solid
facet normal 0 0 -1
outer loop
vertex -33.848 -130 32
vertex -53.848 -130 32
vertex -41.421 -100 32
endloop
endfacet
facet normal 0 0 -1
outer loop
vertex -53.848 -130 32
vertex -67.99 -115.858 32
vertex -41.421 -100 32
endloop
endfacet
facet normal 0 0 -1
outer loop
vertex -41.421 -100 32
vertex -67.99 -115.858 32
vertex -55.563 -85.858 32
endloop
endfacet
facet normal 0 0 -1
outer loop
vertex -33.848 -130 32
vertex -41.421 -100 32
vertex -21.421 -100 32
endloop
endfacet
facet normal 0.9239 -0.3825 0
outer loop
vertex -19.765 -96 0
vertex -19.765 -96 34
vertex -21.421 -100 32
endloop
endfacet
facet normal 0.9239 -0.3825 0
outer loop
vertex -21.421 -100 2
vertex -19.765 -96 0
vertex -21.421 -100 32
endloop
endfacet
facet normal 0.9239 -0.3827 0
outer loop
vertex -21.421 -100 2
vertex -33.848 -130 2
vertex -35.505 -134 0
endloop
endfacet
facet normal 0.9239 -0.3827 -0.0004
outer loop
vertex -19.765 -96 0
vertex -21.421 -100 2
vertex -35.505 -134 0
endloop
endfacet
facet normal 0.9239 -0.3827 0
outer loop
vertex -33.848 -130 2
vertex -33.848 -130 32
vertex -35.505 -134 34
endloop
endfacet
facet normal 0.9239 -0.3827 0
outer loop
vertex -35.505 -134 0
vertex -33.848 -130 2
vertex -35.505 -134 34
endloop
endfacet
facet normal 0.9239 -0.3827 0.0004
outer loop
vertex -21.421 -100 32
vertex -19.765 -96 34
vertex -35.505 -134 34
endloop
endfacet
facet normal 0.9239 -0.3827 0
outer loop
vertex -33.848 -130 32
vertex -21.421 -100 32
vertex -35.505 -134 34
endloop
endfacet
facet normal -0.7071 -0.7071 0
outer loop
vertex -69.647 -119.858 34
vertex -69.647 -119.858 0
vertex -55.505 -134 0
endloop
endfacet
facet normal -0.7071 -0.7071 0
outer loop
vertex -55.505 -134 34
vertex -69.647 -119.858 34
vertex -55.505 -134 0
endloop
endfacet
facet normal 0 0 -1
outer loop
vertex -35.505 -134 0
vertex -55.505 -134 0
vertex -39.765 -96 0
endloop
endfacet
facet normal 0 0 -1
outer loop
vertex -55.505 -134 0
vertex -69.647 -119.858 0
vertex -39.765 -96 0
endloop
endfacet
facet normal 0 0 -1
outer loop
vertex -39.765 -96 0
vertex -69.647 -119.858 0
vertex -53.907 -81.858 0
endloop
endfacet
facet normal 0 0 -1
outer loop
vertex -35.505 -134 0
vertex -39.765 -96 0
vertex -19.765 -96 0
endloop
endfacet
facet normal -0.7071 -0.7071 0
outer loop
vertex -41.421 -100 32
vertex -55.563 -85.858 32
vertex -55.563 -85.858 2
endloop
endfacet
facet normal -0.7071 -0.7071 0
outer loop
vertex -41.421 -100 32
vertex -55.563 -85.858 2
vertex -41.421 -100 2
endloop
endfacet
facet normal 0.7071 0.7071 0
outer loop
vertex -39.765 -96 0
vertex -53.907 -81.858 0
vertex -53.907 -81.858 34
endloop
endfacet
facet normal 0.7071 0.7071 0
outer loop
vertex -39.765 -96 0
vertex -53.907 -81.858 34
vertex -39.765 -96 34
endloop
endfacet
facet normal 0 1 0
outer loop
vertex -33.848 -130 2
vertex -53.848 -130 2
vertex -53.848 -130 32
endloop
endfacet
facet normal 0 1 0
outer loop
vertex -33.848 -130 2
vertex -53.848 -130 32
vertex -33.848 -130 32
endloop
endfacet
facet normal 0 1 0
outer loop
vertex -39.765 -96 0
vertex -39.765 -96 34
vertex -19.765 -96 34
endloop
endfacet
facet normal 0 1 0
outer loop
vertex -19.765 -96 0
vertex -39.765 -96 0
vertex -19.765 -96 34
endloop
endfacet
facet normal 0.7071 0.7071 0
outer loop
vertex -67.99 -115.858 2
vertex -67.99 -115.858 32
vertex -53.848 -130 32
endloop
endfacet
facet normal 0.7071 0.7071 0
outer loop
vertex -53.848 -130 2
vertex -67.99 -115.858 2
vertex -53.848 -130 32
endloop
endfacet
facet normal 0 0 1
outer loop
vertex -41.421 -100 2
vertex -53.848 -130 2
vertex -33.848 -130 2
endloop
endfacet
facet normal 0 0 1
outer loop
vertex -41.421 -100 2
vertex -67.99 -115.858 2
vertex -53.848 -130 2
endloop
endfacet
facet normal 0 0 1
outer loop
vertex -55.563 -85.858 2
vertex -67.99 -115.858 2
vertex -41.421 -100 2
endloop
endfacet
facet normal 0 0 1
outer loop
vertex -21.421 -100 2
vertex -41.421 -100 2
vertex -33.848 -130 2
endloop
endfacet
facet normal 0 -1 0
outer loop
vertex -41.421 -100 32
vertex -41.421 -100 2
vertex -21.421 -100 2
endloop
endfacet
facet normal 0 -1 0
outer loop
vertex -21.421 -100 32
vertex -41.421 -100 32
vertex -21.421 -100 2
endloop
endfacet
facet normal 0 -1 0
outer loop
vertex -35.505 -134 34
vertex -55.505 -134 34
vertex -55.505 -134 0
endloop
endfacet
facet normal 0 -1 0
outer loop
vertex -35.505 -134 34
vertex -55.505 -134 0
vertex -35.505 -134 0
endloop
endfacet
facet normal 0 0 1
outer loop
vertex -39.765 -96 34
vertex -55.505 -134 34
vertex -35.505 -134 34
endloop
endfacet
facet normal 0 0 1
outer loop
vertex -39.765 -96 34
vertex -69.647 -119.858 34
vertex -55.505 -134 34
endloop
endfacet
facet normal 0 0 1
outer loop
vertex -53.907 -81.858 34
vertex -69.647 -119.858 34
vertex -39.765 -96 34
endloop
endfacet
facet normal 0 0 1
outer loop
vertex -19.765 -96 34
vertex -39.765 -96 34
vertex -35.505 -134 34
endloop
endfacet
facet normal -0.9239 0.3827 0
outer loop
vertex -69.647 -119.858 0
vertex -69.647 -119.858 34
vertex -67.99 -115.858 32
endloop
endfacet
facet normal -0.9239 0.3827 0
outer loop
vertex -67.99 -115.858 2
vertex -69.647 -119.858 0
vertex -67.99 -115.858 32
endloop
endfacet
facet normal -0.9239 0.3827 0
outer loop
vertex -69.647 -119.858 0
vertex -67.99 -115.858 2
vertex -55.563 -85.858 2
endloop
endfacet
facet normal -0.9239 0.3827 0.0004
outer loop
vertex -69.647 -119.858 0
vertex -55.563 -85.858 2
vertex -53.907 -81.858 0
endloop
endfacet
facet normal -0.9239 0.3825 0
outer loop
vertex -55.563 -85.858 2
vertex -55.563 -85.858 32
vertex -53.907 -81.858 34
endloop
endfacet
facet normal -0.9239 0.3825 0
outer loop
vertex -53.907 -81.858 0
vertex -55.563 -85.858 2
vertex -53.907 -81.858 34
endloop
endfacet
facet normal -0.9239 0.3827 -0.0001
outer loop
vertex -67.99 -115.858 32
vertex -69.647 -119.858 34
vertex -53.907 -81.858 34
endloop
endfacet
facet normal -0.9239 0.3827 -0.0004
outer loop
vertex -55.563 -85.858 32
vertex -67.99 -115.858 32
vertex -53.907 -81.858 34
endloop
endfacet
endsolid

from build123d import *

# Parameters (mm, degrees)
RESSALTO_EXTRUS_O1_DEPTH   = 34
RESSALTO_EXTRUS_O1_2_DEPTH = 34
RESSALTO_EXTRUS_O2_DEPTH   = 2
RESSALTO_EXTRUS_O3_START   = 34
RESSALTO_EXTRUS_O3_DEPTH   = 2
CORTE_EXTRUS_O1_REACH      = 194.531


with BuildPart() as part:
    # Esboço1 → Ressalto-extrusão1 (new body)
    with BuildSketch(Plane.XY):
        Polygon((55.504617358, -134), (134, -55.504617358), (134, 55.504617358), (55.504617358, 134), (-55.504617358, 134), (-134, 55.504617358), (-134, -55.504617358), (-55.504617358, -134), align=None)
        Polygon((130, -53.847763109), (130, 53.847763109), (53.847763109, 130), (-53.847763109, 130), (-130, 53.847763109), (-130, -53.847763109), (-53.847763109, -130), (53.847763109, -130), align=None, mode=Mode.SUBTRACT)
    extrude(amount=RESSALTO_EXTRUS_O1_DEPTH)



with BuildPart() as body_2:
    # Esboço1 → Ressalto-extrus_o1 2 (new body)
    with BuildSketch(Plane.XY):
        Polygon((41.421356237, -100), (100, -41.421356237), (100, 41.421356237), (41.421356237, 100), (-41.421356237, 100), (-100, 41.421356237), (-100, -41.421356237), (-41.421356237, -100), align=None)
        Polygon((96, -39.764501988), (96, 39.764501988), (39.764501988, 96), (-39.764501988, 96), (-96, 39.764501988), (-96, -39.764501988), (-39.764501988, -96), (39.764501988, -96), align=None, mode=Mode.SUBTRACT)
    extrude(amount=RESSALTO_EXTRUS_O1_2_DEPTH)


with BuildPart() as part_1:
    add(part.part)

    add(body_2.part)  # Ressalto-extrusão2 merges body 2
    # Esboço1<6> → Ressalto-extrusão2 (add)
    with BuildSketch(Plane.XY):
        Polygon((53.847763109, -130), (130, -53.847763109), (130, 53.847763109), (53.847763109, 130), (-53.847763109, 130), (-130, 53.847763109), (-130, -53.847763109), (-53.847763109, -130), align=None)
        Polygon((100, -41.421356237), (100, 41.421356237), (41.421356237, 100), (-41.421356237, 100), (-100, 41.421356237), (-100, -41.421356237), (-41.421356237, -100), (41.421356237, -100), align=None, mode=Mode.SUBTRACT)
    extrude(amount=RESSALTO_EXTRUS_O2_DEPTH)

    # Esboço1<7> → Ressalto-extrusão3 (add)
    with BuildSketch(Plane.XY.offset(RESSALTO_EXTRUS_O3_START)):
        Polygon((53.847763109, -130), (130, -53.847763109), (130, 53.847763109), (53.847763109, 130), (-53.847763109, 130), (-130, 53.847763109), (-130, -53.847763109), (-53.847763109, -130), align=None)
        Polygon((100, -41.421356237), (100, 41.421356237), (41.421356237, 100), (-41.421356237, 100), (-100, 41.421356237), (-100, -41.421356237), (-41.421356237, -100), (41.421356237, -100), align=None, mode=Mode.SUBTRACT)
    extrude(amount=-RESSALTO_EXTRUS_O3_DEPTH)

    # Esboço2 → Corte-extrusão1 (cut, up to next)
    with BuildSketch(Plane.XY.offset(34), mode=Mode.PRIVATE) as corte_extrus_o1_sk1:
        Polygon((-134, -55.504617358), (-69.646752982, -119.857864376), (-53.906637612, -81.857864376), (-96, -39.764501988), (-96, 39.764501988), (-39.764501988, 96), (39.764501988, 96), (96, 39.764501988), (96, -39.764501988), (39.764501988, -96), (-19.764501988, -96), (-35.504617358, -134), (55.504617358, -134), (134, -55.504617358), (134, 55.504617358), (55.504617358, 134), (-55.504617358, 134), (-134, 55.504617358), align=None)
    corte_extrus_o1_tool1 = extrude(corte_extrus_o1_sk1.sketch, amount=-CORTE_EXTRUS_O1_REACH, mode=Mode.PRIVATE) & part_1.part
    add(corte_extrus_o1_tool1.solids().sort_by_distance((-99.143376, -85.001241, 34))[0], mode=Mode.SUBTRACT)


solid = part_1.part
